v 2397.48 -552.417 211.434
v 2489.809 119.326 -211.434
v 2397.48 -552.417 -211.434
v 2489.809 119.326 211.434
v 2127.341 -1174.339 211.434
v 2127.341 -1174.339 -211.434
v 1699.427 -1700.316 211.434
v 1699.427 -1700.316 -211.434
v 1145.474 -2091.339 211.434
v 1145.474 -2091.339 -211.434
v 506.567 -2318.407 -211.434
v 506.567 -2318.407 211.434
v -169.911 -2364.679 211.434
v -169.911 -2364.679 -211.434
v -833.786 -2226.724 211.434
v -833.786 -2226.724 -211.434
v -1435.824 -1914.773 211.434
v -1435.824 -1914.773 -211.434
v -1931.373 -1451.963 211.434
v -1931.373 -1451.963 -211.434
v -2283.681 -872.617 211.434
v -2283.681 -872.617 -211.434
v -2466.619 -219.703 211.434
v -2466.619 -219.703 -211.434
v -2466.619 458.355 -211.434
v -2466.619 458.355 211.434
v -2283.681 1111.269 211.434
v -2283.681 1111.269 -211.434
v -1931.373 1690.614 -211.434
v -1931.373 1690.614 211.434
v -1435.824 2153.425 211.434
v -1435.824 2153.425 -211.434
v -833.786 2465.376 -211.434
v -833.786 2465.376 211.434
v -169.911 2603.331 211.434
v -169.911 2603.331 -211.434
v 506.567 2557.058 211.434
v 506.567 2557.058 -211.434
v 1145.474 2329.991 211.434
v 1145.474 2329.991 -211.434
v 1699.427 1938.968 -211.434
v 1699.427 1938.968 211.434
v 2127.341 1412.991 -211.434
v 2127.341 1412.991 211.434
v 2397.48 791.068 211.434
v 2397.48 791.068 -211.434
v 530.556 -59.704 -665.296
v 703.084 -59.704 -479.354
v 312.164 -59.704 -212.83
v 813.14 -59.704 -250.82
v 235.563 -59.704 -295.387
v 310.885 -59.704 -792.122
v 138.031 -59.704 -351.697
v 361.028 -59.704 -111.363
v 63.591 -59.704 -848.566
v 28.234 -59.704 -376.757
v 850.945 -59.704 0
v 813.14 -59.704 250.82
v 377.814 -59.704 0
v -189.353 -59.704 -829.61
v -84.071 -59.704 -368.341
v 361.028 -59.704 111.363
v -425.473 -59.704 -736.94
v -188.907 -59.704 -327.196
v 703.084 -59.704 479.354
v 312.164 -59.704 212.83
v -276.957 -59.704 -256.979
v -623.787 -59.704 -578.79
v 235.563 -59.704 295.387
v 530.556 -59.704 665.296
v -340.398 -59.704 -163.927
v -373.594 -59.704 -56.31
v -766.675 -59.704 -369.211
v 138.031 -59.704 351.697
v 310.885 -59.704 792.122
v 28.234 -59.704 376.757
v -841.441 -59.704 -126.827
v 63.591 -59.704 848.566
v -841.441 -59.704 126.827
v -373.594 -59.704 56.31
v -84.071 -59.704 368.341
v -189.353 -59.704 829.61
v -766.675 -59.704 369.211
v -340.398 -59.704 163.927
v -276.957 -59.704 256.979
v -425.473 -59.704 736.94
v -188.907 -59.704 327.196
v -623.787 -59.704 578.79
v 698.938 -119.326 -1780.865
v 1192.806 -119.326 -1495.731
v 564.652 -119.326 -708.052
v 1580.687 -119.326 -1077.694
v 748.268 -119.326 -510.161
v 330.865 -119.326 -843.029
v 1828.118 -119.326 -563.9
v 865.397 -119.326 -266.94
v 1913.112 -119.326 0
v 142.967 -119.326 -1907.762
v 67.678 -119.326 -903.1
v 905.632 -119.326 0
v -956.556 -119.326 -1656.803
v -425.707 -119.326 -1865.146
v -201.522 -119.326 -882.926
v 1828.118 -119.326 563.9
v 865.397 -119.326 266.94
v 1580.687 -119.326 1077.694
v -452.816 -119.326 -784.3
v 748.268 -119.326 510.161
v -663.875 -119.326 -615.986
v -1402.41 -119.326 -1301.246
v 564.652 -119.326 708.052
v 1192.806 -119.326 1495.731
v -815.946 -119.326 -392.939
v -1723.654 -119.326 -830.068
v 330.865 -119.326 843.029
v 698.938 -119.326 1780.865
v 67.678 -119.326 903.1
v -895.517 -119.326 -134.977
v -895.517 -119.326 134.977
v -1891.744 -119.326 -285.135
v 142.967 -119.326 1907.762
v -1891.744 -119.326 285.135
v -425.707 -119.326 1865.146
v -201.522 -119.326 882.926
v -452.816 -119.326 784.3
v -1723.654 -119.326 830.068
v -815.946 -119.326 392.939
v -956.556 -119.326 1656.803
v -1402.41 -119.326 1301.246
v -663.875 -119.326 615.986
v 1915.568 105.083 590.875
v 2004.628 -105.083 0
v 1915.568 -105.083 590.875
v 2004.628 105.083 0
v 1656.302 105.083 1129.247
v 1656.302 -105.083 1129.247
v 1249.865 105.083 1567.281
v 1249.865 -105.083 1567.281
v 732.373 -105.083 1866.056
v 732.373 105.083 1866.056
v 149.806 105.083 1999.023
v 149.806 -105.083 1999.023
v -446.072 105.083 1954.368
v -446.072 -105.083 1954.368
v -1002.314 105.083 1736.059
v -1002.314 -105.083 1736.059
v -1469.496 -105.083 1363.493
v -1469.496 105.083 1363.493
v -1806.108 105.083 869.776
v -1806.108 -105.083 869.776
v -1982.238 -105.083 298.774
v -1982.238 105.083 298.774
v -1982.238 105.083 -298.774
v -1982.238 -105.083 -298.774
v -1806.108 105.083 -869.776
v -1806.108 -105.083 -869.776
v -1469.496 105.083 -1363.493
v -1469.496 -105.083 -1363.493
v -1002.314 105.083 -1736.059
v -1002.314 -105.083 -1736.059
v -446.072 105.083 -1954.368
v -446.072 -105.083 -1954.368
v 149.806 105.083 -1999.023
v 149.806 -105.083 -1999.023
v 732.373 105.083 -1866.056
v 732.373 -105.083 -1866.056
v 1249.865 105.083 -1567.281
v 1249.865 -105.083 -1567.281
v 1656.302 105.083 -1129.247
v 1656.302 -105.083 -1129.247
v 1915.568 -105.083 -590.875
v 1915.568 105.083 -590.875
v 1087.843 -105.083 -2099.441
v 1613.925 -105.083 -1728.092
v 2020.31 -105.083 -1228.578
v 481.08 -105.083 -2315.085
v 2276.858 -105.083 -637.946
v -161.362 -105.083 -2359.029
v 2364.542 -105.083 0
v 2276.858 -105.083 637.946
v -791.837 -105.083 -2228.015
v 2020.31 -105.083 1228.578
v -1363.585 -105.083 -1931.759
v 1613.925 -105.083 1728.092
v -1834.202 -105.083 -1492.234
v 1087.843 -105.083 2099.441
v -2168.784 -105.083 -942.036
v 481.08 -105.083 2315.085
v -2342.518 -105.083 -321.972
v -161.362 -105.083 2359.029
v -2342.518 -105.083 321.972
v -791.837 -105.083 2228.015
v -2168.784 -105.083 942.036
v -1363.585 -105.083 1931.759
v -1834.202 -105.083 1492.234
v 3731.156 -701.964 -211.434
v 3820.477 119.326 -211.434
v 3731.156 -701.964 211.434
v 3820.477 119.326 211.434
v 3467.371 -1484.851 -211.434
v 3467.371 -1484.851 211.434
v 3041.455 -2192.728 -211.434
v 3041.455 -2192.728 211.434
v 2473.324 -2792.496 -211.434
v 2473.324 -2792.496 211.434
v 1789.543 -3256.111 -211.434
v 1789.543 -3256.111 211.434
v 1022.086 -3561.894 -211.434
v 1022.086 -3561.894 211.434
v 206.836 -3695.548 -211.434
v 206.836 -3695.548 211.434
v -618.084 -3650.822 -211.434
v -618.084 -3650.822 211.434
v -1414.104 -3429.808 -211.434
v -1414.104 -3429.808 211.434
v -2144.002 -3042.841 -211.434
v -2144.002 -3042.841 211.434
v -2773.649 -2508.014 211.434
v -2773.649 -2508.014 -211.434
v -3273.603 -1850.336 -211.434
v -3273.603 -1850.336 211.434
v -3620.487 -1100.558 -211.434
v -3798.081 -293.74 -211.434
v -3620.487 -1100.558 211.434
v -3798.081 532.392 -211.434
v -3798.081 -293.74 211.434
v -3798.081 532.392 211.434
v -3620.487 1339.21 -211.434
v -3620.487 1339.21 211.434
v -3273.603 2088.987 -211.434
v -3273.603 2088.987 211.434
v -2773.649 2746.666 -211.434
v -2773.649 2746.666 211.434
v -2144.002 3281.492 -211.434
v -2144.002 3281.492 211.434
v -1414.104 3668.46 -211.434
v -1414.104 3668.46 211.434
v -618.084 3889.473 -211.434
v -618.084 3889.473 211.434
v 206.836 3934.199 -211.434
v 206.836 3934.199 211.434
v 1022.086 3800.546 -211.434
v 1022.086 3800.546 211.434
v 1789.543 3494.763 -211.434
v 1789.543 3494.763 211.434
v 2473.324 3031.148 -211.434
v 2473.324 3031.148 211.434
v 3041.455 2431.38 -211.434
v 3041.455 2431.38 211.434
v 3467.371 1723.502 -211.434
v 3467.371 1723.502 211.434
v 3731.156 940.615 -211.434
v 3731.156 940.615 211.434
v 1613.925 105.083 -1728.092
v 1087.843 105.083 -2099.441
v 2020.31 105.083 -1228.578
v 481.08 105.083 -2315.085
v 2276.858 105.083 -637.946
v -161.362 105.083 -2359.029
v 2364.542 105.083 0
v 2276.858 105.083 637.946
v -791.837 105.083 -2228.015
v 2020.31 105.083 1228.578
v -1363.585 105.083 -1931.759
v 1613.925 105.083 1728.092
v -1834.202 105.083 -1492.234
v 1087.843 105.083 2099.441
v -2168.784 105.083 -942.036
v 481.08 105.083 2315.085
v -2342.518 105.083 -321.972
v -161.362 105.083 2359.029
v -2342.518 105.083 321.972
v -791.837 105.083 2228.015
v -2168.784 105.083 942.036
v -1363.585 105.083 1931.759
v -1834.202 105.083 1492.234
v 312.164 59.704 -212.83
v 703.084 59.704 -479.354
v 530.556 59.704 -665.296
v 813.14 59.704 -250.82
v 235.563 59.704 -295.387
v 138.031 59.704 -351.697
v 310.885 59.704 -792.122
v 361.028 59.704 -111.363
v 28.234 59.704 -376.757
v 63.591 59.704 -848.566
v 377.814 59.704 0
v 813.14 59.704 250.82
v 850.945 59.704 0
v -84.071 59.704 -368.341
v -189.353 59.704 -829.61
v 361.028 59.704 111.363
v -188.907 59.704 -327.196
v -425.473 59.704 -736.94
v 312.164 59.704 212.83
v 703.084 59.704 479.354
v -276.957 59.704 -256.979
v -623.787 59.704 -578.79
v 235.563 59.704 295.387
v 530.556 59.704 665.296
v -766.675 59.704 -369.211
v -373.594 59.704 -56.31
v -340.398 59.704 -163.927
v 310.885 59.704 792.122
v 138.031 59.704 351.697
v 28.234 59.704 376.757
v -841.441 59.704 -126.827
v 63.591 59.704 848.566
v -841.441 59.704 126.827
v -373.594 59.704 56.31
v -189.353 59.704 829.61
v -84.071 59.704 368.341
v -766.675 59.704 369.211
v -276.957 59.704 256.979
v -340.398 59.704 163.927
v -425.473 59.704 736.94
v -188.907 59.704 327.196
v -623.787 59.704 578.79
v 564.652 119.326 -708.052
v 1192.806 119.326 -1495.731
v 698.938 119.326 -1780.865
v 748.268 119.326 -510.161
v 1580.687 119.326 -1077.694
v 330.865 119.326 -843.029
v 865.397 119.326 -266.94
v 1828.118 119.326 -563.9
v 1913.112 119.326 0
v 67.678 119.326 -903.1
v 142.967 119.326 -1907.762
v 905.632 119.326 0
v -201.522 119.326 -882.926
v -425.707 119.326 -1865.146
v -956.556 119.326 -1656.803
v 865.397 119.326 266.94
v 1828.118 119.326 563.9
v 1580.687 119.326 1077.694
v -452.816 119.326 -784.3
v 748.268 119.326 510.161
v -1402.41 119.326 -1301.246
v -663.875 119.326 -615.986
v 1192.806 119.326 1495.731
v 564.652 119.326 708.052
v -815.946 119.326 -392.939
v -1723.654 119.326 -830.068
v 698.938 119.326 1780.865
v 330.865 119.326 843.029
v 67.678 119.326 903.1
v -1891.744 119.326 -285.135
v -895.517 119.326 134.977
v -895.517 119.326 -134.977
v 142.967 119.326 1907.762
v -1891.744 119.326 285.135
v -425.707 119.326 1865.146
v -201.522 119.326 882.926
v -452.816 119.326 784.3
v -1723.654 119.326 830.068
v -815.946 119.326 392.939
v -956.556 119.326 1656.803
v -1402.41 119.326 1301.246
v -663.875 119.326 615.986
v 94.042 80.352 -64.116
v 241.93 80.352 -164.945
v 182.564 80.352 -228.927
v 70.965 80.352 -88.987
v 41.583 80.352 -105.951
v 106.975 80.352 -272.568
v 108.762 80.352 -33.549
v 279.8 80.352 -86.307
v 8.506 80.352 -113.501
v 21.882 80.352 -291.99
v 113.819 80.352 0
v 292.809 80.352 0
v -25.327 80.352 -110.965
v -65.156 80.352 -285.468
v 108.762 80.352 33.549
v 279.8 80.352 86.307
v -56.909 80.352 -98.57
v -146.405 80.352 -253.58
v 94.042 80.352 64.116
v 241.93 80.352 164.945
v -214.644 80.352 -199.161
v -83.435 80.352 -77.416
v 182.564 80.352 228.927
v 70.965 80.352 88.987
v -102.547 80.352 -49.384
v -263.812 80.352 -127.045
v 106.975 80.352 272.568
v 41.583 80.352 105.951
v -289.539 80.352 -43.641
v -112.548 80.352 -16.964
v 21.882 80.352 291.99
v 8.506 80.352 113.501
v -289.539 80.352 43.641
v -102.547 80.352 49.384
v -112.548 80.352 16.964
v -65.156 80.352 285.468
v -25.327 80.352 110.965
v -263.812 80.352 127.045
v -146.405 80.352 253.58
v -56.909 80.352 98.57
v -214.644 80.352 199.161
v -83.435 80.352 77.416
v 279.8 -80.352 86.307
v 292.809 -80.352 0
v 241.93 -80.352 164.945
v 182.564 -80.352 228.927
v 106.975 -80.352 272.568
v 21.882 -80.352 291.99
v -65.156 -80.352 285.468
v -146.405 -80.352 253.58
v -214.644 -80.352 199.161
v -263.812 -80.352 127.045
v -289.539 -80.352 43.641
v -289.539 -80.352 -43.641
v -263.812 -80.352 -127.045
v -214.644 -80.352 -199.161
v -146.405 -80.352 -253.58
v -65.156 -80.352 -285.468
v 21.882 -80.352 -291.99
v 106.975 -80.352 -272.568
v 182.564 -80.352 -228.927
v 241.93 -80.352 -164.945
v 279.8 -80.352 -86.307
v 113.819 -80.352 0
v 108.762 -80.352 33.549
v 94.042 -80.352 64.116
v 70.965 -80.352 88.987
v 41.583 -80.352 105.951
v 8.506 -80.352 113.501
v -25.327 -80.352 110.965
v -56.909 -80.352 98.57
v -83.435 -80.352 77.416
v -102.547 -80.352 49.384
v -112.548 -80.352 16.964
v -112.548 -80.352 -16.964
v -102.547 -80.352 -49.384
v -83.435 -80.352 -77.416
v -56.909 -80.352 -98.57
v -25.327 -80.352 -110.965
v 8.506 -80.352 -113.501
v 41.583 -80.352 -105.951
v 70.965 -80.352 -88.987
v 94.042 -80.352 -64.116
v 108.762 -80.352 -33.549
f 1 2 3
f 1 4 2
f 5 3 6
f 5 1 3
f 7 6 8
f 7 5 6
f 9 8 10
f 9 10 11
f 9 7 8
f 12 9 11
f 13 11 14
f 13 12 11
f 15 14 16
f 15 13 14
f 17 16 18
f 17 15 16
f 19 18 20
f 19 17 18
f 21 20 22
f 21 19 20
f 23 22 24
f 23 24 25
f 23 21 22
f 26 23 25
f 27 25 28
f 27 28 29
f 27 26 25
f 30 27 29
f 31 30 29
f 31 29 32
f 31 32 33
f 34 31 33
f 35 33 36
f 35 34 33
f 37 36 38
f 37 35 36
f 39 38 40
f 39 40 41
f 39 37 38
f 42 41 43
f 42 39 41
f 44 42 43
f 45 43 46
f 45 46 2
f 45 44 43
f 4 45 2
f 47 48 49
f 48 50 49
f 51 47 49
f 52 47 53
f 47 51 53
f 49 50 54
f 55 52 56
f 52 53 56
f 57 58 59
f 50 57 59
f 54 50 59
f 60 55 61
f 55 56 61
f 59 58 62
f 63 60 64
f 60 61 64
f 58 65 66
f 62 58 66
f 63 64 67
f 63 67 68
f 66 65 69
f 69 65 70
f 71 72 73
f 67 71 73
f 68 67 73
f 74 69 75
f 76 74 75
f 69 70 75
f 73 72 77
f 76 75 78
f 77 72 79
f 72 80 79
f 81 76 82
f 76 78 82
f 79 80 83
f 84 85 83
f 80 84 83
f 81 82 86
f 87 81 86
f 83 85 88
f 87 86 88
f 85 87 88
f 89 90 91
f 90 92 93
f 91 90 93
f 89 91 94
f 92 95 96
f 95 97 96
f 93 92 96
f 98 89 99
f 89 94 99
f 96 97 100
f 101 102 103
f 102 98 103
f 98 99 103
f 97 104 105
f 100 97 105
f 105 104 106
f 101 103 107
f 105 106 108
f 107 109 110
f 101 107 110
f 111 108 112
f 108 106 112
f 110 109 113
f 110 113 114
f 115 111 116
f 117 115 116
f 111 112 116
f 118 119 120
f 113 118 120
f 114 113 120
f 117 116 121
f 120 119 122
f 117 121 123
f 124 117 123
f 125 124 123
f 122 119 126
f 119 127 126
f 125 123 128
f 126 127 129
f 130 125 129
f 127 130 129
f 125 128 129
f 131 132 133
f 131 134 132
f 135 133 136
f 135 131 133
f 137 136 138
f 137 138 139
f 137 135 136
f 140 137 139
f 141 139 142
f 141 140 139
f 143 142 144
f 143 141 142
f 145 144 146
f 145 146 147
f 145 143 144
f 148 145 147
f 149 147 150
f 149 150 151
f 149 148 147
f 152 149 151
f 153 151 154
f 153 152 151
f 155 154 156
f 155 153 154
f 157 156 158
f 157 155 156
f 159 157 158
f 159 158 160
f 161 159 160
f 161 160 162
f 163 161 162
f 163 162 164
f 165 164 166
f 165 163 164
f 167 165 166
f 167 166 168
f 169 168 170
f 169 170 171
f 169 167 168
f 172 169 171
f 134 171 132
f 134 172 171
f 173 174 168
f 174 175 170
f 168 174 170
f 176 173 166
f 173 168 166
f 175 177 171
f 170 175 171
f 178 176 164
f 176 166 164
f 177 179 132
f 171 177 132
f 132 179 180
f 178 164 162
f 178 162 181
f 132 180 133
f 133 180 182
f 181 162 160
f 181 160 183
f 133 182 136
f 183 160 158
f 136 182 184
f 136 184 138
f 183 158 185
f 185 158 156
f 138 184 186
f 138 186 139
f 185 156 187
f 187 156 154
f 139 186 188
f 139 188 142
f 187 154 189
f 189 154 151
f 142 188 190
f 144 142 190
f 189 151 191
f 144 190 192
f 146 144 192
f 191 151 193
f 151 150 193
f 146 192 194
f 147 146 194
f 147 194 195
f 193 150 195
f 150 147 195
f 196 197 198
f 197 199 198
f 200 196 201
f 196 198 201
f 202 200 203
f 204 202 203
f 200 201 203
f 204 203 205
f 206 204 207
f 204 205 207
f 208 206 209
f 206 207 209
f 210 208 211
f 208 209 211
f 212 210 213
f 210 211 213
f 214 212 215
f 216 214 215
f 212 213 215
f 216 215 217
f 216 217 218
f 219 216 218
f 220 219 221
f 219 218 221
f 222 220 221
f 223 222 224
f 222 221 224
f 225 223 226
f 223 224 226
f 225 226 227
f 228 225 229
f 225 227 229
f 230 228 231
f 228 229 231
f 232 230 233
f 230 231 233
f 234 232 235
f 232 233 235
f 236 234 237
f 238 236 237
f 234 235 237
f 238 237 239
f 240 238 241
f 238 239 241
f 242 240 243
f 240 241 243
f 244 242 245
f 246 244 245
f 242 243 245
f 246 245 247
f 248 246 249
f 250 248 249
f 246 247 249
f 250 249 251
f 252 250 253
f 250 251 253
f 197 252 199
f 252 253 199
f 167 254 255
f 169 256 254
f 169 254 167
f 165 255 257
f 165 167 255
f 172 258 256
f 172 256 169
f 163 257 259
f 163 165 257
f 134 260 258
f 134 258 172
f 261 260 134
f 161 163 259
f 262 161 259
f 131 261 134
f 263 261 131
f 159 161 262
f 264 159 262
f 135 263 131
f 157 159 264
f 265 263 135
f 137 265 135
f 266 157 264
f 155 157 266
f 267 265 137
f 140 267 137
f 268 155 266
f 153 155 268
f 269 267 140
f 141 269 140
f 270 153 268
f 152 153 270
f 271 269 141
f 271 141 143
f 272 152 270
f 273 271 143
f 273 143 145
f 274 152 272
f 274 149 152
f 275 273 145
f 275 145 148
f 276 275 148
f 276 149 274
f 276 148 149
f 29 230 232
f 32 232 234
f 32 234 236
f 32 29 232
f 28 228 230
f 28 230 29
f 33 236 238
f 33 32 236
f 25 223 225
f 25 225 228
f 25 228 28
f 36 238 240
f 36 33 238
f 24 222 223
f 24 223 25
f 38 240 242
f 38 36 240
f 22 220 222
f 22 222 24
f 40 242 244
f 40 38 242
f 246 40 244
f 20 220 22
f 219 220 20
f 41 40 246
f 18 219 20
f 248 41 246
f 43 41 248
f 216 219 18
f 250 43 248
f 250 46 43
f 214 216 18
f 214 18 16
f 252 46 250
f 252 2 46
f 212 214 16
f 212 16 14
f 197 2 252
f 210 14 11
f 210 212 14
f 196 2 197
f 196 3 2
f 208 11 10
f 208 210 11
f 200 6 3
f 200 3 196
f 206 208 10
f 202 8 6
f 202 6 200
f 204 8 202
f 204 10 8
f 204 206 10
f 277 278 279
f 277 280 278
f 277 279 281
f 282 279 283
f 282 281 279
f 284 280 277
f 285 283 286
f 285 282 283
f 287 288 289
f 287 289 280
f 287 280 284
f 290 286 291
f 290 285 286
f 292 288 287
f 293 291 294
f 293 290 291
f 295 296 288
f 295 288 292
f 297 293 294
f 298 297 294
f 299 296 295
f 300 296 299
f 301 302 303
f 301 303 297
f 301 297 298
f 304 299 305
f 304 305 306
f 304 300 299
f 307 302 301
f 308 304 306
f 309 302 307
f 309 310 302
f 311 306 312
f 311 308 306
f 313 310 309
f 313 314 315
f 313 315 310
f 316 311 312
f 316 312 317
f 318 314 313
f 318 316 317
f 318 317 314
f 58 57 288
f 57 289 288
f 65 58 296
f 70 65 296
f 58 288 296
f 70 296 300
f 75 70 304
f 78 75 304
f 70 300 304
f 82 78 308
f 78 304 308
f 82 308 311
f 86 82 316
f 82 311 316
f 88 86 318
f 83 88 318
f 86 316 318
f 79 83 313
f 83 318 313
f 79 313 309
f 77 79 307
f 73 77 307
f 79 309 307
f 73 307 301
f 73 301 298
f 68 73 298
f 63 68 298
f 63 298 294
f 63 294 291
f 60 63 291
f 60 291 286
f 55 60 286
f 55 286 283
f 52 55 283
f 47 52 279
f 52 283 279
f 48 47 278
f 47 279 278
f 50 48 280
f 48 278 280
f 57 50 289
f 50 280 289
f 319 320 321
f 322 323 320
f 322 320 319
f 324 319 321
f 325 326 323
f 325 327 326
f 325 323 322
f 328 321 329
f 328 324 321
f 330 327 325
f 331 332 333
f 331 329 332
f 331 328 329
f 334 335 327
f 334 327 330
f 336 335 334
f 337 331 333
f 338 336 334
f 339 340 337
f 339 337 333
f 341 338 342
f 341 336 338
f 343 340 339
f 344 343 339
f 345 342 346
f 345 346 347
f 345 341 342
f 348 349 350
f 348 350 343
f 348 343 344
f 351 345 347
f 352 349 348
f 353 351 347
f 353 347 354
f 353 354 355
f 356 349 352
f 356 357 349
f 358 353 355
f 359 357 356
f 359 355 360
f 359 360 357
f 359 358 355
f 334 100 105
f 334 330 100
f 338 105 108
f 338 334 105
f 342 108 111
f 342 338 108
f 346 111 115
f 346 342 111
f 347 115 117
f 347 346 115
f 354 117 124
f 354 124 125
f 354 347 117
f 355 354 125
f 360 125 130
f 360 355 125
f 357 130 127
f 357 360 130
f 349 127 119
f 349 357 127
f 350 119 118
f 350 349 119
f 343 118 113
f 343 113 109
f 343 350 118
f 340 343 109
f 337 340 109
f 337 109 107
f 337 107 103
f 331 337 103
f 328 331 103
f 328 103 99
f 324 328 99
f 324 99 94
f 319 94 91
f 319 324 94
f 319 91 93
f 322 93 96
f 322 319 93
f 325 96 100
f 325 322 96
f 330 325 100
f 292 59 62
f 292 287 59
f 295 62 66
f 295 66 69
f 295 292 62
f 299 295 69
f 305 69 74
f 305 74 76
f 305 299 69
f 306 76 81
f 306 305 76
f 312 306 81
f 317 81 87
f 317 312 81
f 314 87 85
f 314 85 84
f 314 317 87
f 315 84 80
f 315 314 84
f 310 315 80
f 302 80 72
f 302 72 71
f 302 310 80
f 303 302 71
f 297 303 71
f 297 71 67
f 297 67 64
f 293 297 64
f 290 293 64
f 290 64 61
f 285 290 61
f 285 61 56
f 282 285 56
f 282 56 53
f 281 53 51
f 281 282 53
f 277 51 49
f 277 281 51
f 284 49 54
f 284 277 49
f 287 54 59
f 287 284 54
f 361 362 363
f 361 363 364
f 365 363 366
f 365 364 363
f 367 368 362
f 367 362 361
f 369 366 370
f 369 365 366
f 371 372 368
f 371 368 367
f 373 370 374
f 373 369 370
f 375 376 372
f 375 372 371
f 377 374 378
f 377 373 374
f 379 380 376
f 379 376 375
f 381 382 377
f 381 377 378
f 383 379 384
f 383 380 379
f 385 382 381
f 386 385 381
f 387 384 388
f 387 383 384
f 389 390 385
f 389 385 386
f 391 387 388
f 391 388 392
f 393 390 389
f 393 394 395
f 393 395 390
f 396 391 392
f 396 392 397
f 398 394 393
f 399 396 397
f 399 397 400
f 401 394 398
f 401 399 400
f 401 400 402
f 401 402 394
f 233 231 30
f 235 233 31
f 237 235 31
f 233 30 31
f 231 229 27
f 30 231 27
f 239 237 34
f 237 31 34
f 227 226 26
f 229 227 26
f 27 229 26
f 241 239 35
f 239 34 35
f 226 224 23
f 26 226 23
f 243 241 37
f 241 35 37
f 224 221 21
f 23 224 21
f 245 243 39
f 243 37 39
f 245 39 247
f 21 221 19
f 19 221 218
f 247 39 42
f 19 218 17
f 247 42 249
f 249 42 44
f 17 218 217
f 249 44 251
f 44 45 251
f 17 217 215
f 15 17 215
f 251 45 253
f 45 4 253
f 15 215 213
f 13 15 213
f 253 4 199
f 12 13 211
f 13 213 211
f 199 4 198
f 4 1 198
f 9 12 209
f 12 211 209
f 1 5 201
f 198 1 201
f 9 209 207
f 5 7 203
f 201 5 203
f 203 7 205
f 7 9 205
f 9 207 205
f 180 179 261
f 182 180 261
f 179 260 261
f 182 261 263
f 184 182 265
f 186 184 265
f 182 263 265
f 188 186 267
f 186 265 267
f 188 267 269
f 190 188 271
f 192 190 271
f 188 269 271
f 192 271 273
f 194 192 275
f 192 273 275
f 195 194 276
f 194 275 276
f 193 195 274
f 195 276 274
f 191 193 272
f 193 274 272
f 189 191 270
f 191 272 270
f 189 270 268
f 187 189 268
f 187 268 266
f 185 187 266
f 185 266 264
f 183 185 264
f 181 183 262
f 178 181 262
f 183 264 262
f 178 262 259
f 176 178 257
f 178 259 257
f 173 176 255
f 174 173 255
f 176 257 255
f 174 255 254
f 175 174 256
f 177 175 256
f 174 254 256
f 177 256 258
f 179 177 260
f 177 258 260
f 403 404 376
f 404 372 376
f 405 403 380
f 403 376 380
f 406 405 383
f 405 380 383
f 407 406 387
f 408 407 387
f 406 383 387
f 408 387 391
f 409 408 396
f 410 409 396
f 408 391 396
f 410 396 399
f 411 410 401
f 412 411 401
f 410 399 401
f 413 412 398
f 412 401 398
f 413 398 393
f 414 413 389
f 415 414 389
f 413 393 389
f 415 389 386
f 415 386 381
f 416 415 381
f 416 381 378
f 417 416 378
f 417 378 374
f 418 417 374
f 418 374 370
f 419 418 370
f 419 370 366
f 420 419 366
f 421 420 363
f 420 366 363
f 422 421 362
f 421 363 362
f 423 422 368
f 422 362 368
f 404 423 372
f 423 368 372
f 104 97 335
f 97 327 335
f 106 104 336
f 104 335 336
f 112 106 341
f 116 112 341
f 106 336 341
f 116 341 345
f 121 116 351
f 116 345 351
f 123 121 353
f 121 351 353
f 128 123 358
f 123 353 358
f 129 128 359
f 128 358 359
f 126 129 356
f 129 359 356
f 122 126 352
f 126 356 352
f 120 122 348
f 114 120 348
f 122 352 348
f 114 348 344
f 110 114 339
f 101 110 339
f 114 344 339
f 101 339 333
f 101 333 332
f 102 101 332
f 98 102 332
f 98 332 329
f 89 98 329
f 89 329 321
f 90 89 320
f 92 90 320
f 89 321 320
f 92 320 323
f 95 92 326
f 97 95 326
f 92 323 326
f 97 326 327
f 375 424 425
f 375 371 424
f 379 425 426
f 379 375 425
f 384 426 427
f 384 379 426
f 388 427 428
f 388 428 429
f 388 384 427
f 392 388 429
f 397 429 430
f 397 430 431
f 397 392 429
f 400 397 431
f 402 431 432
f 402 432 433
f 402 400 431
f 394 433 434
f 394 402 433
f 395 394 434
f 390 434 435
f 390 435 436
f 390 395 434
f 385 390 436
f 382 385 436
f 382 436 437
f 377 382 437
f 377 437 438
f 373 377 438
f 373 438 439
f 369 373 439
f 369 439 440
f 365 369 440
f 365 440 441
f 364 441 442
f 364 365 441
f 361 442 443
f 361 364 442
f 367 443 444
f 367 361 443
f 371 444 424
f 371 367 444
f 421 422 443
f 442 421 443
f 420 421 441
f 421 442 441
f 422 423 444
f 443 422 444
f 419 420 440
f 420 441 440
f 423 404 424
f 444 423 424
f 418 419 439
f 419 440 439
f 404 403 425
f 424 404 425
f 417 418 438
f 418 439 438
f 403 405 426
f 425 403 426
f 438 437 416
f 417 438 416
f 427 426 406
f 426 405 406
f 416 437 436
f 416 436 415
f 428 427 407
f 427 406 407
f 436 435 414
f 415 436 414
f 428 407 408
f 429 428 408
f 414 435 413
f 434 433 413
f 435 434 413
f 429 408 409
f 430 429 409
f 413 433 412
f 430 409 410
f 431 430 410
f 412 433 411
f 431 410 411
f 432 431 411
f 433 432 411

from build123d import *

# Parameters (mm, degrees)
F0_W = 178.990364
F0_H = 160.704672
F2_W = 473.131418
F2_H = 119.407774
F4_W = 1007.479668
F4_H = 238.651752
F6_W = 359.913291
F6_H = 210.165144
F8_W = 1330.667496
F8_H = 422.868728


with BuildPart() as f1:
    # F0 (on Top) → F1 (revolve)
    with BuildSketch(Plane.XY):
        with Locations((203.314006, 0)):
            Rectangle(F0_W, F0_H)
    revolve(axis=Axis((0, 14.369354, 0), (0, -1, 0)))


with BuildPart() as f3:
    # F2 (on Top) → F3 (revolve)
    with BuildSketch(Plane.XY):
        with Locations((614.379406, 0)):
            Rectangle(F2_W, F2_H)
    revolve(axis=Axis((0, 14.369354, 0), (0, -1, 0)))


with BuildPart() as f5:
    # F4 (on Top) → F5 (revolve)
    with BuildSketch(Plane.XY):
        with Locations((1409.371853, 0)):
            Rectangle(F4_W, F4_H)
    revolve(axis=Axis((0, 14.369354, 0), (0, -1, 0)))


with BuildPart() as f7:
    # F6 (on Top) → F7 (revolve)
    with BuildSketch(Plane.XY):
        with Locations((2184.584885, 0)):
            Rectangle(F6_W, F6_H)
    revolve(axis=Axis((0, 14.369354, 0), (0, -1, 0)))


with BuildPart() as f9:
    # F8 (on face) → F9 (revolve)
    with BuildSketch(Plane(origin=(0, 119.325876, 0), x_dir=(-1, 0, 0), z_dir=(0, 1, 0))):
        with Locations((-3155.142784, 0)):
            Rectangle(F8_W, F8_H)
    revolve(axis=Axis((0, 119.325876, -1.446307), (0, 0, -1)))


solid = Compound([f1.part, f3.part, f5.part, f7.part, f9.part])
